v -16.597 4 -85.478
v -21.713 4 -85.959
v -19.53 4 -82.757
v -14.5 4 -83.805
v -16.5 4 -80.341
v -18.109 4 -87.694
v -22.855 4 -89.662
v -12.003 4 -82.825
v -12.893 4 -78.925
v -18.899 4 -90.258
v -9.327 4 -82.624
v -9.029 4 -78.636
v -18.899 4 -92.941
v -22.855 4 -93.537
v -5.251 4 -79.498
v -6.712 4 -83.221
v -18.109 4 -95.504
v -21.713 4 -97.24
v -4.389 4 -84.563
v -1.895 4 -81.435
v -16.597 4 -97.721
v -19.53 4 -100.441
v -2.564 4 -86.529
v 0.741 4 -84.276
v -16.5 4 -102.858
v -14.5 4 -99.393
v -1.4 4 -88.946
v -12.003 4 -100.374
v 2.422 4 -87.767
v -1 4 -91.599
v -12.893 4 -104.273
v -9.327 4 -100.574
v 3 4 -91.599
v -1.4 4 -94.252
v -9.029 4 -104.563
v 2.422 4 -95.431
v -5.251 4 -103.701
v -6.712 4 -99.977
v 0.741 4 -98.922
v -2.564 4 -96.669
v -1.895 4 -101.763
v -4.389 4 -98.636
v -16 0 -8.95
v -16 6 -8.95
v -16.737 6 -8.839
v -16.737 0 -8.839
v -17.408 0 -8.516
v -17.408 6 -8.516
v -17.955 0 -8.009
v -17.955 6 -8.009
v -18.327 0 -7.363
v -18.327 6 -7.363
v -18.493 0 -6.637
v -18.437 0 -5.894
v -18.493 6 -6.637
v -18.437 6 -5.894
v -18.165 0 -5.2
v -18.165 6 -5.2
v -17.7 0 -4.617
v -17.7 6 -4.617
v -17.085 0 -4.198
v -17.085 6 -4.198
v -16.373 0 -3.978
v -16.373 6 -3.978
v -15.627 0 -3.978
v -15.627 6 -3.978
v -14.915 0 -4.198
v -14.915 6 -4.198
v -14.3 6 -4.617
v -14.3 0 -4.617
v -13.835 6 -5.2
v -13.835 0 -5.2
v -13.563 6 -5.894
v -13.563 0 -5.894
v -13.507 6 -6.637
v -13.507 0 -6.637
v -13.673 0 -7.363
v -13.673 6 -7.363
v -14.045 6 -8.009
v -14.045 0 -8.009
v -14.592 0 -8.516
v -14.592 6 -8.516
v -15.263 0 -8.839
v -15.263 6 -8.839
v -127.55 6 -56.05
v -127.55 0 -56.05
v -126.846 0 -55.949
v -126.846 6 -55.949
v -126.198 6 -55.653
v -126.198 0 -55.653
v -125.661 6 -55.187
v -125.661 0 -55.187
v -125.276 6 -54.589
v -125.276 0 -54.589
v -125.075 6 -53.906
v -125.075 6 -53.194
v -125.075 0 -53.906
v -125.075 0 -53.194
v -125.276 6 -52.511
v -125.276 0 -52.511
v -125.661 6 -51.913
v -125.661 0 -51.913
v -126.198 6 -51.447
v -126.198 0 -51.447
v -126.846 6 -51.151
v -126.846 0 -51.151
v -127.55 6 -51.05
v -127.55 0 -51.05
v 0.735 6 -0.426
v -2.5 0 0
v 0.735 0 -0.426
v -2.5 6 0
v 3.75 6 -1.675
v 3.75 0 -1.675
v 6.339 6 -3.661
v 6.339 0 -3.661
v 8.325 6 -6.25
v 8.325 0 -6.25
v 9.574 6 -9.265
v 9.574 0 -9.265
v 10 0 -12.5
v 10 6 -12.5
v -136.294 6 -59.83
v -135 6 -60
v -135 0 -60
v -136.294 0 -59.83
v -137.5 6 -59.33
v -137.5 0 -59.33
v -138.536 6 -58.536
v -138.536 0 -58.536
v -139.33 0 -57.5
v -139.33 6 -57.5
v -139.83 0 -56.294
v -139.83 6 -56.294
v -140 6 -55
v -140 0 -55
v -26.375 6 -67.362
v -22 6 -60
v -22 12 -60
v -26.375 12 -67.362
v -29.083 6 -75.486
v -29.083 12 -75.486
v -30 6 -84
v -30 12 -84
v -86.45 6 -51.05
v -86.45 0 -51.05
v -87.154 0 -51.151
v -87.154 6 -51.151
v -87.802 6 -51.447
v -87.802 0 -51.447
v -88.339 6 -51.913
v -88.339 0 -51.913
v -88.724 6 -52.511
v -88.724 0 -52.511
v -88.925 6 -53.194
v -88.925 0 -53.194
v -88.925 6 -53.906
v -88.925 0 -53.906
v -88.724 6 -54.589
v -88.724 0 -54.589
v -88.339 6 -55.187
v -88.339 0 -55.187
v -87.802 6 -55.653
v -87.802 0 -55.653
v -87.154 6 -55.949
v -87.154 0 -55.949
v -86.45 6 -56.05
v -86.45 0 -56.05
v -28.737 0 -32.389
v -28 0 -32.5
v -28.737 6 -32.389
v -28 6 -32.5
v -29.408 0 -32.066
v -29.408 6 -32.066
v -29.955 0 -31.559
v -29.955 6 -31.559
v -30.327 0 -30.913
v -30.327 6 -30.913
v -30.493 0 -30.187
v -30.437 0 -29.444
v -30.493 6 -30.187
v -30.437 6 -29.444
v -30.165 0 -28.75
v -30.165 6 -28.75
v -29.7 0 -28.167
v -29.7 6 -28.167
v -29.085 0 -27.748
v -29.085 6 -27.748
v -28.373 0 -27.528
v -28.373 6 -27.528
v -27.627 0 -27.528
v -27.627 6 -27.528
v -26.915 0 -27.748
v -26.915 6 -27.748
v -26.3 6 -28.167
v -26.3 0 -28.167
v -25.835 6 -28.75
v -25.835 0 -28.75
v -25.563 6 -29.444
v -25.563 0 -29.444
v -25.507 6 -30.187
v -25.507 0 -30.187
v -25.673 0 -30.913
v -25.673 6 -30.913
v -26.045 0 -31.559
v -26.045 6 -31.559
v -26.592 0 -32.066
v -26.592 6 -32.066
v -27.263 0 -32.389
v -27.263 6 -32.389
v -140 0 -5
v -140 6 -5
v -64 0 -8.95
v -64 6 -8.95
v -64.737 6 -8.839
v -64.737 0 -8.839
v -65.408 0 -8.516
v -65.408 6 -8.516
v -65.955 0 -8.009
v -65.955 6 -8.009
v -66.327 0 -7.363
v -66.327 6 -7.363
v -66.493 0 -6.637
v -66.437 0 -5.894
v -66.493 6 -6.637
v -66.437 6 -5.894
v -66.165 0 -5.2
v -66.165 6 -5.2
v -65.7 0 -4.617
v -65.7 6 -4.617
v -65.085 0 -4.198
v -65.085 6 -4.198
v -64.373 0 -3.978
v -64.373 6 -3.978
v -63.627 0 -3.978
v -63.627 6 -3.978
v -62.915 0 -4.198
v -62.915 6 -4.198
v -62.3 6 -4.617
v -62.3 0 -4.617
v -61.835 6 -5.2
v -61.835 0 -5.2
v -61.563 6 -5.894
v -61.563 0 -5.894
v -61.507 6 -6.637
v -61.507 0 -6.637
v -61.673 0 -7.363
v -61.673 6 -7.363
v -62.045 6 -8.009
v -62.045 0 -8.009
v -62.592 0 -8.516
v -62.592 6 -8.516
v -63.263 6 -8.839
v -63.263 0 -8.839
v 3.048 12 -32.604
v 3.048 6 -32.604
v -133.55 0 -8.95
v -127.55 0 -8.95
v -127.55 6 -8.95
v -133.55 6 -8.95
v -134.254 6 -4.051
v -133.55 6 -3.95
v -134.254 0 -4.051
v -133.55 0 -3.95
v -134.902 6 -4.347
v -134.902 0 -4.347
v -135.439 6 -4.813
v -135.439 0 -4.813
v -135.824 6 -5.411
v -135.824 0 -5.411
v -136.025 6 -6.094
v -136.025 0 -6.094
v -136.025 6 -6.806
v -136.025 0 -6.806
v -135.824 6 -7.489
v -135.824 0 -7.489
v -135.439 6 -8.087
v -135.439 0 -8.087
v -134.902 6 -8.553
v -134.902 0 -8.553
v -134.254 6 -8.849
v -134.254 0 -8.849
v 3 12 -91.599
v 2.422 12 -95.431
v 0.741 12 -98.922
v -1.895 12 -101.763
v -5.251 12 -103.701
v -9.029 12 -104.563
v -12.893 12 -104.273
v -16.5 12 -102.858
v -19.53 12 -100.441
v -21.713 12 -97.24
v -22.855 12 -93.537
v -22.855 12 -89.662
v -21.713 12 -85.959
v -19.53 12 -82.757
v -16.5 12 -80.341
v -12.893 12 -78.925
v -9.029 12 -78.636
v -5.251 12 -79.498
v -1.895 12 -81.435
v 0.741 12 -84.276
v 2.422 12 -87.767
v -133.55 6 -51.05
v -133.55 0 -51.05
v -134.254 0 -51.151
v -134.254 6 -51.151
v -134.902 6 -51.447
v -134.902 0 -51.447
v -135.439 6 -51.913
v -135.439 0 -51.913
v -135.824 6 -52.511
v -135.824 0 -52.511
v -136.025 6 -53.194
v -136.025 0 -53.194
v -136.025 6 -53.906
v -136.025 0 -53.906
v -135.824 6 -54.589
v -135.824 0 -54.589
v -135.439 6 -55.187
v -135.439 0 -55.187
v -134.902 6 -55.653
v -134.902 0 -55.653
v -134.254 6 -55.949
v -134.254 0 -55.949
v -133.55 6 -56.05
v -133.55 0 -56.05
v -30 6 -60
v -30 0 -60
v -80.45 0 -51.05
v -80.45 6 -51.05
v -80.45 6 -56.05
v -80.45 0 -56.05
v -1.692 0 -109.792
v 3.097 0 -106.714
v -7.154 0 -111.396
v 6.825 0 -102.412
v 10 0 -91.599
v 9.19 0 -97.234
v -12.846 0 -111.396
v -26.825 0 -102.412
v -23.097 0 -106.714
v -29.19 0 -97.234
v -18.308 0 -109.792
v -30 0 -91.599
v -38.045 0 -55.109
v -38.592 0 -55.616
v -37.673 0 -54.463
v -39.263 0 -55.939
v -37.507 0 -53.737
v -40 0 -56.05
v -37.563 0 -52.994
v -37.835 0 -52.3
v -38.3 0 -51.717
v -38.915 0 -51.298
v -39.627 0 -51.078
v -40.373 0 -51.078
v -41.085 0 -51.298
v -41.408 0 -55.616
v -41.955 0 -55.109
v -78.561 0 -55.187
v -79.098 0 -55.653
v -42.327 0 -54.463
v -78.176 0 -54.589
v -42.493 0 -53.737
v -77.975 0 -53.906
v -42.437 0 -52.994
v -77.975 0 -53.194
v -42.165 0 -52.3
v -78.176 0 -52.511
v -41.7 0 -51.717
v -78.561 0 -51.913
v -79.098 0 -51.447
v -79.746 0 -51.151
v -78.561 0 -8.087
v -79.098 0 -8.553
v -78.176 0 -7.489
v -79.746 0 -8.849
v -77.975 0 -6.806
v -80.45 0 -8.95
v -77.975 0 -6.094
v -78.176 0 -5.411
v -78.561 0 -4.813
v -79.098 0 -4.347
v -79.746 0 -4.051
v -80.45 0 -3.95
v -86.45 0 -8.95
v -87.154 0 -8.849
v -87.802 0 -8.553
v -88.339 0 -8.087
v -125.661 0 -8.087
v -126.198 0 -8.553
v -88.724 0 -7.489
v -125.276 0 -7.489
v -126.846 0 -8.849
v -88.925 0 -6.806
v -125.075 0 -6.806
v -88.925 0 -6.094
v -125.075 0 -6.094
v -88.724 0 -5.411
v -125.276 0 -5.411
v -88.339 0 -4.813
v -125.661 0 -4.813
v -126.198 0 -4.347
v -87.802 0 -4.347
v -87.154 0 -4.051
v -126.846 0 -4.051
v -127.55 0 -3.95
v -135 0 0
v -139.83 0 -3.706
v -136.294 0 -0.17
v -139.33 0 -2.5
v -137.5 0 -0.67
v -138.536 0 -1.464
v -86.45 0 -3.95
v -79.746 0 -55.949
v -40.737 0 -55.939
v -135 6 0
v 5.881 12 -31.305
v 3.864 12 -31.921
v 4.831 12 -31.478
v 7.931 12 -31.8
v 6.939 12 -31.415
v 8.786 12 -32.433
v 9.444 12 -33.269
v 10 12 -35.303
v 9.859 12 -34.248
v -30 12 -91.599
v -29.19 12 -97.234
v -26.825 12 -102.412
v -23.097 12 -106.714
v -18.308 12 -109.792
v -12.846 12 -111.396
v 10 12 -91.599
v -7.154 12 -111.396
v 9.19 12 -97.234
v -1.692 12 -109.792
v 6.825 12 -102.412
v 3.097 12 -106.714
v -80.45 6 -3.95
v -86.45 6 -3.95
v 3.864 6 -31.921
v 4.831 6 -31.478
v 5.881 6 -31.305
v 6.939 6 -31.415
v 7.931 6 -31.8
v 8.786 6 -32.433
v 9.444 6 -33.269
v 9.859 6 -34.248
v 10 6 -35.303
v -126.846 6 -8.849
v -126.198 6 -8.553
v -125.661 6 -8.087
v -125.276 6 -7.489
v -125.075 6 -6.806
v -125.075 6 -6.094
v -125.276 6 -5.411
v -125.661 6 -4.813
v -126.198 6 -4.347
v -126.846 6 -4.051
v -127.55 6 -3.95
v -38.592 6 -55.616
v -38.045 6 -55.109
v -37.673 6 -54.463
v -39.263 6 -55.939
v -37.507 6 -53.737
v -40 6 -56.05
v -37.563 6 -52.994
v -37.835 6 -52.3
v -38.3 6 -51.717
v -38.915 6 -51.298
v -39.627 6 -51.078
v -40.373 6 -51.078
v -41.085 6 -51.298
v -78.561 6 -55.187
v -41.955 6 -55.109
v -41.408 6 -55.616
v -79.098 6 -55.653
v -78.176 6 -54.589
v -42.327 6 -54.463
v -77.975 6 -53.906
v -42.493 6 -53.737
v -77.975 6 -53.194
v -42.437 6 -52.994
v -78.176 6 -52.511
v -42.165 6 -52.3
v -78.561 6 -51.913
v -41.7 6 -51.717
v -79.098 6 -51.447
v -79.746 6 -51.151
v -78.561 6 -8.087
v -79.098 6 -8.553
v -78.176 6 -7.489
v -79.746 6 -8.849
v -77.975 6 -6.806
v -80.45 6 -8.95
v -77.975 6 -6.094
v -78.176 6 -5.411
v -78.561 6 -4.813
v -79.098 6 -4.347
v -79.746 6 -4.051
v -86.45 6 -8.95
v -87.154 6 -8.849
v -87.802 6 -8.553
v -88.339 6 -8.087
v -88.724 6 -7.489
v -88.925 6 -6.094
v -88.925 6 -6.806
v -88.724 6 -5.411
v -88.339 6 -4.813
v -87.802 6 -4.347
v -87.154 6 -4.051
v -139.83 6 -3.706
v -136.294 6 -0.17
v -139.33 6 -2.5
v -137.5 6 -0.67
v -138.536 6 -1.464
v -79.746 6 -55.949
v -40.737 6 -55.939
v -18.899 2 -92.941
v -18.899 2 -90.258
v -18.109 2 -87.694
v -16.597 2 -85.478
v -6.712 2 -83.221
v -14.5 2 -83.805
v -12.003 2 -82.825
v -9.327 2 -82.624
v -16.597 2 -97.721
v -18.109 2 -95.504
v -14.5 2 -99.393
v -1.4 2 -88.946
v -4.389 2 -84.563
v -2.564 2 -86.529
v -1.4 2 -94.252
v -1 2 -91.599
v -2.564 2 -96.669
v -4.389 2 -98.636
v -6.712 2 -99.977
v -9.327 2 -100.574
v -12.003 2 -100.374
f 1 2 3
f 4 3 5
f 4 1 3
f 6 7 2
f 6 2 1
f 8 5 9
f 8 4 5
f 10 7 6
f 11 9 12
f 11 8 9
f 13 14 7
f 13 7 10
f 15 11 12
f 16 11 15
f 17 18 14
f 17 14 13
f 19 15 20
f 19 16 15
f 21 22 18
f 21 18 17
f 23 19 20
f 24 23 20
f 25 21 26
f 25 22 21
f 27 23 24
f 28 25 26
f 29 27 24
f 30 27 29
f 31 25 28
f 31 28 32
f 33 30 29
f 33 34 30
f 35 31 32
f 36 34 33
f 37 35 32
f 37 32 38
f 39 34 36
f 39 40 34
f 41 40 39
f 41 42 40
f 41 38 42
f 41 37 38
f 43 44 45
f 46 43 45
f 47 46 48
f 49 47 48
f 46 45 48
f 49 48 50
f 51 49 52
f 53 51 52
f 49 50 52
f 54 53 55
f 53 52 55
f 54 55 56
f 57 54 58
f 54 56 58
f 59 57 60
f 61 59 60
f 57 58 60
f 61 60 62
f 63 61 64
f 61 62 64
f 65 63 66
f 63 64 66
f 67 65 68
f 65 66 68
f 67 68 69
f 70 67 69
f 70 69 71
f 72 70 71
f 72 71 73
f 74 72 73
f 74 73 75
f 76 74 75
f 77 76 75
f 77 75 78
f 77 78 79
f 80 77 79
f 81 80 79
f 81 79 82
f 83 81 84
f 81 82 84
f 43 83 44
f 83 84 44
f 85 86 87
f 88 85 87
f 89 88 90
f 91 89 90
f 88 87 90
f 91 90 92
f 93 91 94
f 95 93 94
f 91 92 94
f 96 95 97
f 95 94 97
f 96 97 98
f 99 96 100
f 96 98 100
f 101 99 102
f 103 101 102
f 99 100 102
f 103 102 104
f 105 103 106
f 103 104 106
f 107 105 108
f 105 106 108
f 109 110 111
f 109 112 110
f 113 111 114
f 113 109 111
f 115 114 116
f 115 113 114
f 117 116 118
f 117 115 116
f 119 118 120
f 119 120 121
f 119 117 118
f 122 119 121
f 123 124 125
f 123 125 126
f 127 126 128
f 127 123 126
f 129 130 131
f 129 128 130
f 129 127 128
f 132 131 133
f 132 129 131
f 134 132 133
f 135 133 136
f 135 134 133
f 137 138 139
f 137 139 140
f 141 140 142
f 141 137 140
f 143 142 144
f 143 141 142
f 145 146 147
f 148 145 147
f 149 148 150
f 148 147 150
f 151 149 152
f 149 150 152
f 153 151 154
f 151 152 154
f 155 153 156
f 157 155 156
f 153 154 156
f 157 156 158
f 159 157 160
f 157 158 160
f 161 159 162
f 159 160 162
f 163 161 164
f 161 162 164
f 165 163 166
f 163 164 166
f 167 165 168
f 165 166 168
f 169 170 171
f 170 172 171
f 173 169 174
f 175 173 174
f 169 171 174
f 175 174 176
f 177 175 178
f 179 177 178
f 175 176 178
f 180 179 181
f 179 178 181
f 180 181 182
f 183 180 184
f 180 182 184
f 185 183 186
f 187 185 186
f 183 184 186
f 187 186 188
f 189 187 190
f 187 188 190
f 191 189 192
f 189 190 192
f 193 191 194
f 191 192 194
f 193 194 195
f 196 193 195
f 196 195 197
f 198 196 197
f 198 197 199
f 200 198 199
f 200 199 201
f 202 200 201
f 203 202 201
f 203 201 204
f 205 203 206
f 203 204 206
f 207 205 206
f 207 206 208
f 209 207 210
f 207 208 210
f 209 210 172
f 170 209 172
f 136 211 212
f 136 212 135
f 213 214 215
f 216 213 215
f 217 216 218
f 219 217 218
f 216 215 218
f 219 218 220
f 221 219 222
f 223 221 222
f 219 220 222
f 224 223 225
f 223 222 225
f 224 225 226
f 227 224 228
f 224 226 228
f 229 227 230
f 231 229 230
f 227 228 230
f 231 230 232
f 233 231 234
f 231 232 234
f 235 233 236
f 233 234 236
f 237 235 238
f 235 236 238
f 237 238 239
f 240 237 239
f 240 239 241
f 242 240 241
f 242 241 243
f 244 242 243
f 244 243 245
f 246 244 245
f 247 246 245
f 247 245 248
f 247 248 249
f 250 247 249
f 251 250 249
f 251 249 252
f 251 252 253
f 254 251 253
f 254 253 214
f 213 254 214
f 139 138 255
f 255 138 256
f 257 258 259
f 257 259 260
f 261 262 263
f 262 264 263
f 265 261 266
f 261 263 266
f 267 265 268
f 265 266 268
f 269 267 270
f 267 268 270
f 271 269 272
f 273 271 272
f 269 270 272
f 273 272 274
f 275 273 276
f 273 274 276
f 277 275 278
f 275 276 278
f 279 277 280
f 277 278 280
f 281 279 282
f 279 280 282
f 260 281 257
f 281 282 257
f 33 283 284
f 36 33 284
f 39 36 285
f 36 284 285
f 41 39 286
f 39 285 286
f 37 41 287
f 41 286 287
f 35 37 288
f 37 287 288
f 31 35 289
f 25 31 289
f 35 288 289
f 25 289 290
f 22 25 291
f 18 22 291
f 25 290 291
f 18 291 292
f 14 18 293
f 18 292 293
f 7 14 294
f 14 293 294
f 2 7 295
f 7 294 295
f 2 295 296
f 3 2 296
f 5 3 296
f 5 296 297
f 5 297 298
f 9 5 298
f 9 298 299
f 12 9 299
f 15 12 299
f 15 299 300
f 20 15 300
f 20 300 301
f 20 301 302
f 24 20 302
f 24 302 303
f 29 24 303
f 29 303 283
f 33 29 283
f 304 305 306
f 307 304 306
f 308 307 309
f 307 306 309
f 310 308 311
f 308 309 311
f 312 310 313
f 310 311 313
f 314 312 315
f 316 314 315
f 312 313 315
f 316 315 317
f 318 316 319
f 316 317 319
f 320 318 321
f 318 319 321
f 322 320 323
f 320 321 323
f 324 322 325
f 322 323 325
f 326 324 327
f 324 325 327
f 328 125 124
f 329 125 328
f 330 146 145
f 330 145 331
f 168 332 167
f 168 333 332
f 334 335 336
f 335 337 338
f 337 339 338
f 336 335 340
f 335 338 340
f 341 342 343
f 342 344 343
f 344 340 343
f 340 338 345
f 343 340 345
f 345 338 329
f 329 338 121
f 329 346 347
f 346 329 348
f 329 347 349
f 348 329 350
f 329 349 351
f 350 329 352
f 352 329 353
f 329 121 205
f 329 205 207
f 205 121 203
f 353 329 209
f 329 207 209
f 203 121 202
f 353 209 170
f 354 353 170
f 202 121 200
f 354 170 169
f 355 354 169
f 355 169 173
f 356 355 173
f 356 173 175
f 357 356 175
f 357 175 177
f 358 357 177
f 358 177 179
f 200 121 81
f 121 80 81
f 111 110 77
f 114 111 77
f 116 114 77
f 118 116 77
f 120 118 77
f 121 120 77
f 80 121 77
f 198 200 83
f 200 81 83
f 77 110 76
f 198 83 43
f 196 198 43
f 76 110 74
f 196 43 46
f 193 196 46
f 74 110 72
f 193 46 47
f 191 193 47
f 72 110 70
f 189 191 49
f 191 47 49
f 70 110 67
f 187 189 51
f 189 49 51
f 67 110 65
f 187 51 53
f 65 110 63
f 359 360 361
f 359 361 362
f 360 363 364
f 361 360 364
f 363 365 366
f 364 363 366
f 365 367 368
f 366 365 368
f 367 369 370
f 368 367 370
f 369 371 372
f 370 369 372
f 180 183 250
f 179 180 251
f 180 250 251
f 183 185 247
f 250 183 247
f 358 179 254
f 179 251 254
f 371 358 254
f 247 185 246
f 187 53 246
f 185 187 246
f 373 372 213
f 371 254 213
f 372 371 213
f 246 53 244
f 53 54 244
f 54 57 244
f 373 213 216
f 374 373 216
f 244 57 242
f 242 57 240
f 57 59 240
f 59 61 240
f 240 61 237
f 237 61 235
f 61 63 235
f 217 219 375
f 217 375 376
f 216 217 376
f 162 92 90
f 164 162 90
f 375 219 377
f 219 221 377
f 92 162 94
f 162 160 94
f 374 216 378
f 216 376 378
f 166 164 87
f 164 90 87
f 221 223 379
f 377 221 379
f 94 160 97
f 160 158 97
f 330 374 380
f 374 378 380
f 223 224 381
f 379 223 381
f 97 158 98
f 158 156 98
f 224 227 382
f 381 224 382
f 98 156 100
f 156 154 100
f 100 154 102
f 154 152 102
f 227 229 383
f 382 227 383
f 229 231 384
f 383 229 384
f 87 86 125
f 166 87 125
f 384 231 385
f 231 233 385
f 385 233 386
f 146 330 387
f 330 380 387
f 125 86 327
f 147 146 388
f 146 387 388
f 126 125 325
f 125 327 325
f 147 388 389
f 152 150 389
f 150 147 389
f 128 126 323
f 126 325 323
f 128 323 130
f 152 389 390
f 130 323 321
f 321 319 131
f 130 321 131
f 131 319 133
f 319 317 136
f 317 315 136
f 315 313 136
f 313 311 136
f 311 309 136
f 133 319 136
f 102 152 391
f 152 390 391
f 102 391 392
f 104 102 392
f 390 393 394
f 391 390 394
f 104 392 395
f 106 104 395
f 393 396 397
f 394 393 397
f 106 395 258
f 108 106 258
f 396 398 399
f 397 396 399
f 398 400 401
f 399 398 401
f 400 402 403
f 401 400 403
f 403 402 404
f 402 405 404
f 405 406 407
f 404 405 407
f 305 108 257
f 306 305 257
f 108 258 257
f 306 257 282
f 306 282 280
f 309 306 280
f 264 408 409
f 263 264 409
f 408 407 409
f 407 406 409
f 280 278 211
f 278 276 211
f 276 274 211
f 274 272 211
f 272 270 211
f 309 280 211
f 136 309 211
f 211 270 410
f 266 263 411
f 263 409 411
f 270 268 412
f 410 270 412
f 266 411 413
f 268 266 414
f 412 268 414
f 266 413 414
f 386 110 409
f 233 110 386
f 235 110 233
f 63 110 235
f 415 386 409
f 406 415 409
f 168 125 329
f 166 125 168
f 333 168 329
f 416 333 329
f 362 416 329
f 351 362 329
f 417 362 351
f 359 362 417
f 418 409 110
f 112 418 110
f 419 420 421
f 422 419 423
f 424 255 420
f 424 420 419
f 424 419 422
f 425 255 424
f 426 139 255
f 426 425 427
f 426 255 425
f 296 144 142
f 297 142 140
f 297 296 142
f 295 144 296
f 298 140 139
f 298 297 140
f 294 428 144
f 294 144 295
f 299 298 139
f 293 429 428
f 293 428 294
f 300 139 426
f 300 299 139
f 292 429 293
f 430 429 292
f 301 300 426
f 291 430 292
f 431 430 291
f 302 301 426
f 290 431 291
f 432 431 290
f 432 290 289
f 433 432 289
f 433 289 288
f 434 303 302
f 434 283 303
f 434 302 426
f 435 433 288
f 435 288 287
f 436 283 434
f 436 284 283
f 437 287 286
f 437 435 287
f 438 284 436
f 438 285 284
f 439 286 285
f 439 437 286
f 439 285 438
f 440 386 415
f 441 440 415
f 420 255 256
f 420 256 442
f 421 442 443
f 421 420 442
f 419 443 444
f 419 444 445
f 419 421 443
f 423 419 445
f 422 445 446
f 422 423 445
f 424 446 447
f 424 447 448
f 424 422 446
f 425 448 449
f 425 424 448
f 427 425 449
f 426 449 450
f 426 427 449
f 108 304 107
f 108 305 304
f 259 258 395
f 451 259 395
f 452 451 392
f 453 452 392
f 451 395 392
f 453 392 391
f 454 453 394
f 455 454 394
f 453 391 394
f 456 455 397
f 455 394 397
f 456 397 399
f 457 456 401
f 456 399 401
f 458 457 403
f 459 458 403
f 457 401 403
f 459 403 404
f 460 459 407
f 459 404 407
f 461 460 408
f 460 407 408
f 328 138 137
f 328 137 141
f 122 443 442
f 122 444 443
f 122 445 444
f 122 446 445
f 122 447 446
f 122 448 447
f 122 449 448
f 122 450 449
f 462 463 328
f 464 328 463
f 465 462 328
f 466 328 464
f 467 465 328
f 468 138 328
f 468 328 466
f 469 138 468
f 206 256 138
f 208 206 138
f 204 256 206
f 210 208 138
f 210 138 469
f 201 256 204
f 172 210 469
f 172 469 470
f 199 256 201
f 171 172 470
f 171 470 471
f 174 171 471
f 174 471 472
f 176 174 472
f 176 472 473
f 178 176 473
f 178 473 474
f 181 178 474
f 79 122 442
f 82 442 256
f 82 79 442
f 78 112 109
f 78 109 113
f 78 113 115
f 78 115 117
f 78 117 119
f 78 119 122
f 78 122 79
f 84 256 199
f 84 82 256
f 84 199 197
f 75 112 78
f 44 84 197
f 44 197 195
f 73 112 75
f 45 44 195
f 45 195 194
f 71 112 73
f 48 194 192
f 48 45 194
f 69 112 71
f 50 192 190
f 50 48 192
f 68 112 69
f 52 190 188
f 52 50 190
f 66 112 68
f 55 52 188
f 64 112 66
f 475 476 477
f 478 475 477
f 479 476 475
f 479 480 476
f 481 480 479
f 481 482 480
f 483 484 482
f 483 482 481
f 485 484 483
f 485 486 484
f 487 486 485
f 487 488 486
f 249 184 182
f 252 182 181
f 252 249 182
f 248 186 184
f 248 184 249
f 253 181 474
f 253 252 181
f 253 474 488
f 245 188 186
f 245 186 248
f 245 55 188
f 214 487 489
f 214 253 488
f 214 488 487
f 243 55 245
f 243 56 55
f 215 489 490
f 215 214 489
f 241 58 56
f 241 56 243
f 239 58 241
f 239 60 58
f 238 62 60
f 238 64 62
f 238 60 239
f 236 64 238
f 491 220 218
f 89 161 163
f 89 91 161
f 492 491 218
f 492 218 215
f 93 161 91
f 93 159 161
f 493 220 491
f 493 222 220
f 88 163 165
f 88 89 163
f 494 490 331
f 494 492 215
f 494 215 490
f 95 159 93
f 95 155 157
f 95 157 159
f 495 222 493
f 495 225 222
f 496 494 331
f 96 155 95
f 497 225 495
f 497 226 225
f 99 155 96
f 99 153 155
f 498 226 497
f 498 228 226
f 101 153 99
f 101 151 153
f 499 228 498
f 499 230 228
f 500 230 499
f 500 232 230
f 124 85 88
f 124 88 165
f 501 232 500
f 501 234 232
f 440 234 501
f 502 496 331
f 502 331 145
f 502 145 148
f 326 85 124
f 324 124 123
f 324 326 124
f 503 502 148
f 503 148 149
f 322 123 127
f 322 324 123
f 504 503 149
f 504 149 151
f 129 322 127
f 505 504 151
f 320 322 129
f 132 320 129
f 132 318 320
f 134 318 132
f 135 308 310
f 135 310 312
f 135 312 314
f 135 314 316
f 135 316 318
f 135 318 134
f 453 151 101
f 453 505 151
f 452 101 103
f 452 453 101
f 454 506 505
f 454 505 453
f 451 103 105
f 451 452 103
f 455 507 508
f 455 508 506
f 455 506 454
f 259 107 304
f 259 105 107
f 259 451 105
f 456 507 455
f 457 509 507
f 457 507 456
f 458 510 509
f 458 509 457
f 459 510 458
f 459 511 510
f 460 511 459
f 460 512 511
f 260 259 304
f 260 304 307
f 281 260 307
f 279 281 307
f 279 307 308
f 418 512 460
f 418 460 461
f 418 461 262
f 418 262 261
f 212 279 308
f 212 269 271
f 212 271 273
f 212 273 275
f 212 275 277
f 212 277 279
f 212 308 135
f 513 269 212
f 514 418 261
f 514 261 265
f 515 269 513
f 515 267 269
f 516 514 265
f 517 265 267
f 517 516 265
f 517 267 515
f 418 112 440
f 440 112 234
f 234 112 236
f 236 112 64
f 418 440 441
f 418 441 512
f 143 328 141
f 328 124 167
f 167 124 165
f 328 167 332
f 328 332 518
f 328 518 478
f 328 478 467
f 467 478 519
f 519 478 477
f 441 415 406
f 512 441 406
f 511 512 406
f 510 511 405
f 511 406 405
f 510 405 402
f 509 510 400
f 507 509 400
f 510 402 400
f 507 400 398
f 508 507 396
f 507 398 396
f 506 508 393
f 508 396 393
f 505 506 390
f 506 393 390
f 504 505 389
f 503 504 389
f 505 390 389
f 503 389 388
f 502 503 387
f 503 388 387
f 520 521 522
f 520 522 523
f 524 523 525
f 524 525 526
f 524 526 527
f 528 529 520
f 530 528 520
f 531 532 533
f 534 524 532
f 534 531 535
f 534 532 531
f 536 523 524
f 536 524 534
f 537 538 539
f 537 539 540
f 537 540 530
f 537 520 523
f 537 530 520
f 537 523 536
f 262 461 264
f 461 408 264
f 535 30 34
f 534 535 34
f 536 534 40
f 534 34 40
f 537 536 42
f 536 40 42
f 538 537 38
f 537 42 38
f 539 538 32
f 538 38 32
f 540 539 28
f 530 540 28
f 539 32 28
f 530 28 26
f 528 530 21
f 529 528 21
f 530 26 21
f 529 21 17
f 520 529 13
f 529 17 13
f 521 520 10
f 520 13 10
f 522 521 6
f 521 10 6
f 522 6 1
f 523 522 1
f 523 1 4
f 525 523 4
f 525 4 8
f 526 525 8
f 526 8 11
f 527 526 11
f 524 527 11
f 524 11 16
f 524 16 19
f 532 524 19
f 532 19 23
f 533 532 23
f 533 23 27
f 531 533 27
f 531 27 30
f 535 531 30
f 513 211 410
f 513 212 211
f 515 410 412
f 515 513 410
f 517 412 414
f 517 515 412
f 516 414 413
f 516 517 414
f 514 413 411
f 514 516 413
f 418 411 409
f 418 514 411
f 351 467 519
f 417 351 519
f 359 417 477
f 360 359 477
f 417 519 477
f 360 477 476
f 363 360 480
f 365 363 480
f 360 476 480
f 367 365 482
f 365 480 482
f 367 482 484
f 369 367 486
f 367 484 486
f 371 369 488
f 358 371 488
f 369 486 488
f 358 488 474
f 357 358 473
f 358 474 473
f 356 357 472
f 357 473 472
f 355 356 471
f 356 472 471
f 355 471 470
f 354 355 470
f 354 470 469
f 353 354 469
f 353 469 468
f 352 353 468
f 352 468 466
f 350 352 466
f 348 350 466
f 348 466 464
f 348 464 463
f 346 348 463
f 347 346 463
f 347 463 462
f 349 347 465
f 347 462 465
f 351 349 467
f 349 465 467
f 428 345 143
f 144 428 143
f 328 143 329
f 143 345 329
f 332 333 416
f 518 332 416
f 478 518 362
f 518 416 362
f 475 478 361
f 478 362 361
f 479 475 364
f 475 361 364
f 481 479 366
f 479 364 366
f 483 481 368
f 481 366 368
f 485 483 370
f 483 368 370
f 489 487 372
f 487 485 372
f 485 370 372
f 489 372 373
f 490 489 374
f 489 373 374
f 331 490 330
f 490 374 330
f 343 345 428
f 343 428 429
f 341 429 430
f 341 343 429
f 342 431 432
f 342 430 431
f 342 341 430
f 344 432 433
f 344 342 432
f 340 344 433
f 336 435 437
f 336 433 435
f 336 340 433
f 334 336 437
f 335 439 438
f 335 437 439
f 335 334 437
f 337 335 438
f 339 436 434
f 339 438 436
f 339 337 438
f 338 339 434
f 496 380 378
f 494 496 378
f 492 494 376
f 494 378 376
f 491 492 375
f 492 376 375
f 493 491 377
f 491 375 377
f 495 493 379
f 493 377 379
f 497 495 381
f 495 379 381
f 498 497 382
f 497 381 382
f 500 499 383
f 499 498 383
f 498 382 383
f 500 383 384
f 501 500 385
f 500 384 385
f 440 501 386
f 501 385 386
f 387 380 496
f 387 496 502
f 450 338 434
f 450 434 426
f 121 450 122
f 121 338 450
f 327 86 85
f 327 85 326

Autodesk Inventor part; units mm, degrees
ref_plane "YZ Plane" through (0, 0, 0) normal (1, 0, 0) x (0, 1, 0)
ref_plane "XZ Plane" through (0, 0, 0) normal (0, 1, 0) x (-1, 0, 0)
ref_plane "XY Plane" through (0, 0, 0) normal (0, 0, 1) x (1, 0, 0)
sketch "Sketch1" plane through (0, 0, 0) normal (0, 1, 0) x (-1, 0, 0)
  line L0 (140, 0) -> (74, 0)
  line L1 (74, 0) -> (76, 0)
  line L2 (140, 0) -> (140, -60)
  line L3 (140, -60) -> (140, 0)
  line L4 (138, -58) -> (82, -2)
  line L5 (82, -58) -> (138, -2)
  line L6 (110, -30) -> (110, -49.4)
  line L7 (86.45, -6.45) -> (86.45, -53.55)
  line L8 (82, -58) -> (82, -2)
  line L9 (76, -58) -> (76, -2)
  line L10 (74, 0) -> (74, -60)
  line L11 (74, 0) -> (74, -60)
  circle A0 centre (86.45, -6.45) radius 2.5
  line L12 (76, -2) -> (138, -2)
  line L13 (80.45, -8.95) -> (133.55, -8.95)
  line L14 (80.45, -3.95) -> (133.55, -3.95)
  line L15 (133.55, -6.45) -> (86.45, -6.45)
  line L16 (82, -2) -> (138, -2)
  line L17 (104, -10.6) -> (110, -10.6)
  line L18 (138, -2) -> (138, -58)
  line L19 (138, -2) -> (138, -58)
  line L20 (133.55, -53.55) -> (133.55, -6.45)
  line L21 (140, -60) -> (138, -60)
  line L22 (138, -60) -> (138, -58)
  line L23 (138, -58) -> (140, -58)
  line L24 (140, -58) -> (140, -60)
  line L25 (104, -49.4) -> (110, -49.4)
  circle A1 centre (86.45, -53.55) radius 2.5
  line L26 (133.55, -51.05) -> (80.45, -51.05)
  line L27 (86.45, -53.55) -> (133.55, -53.55)
  line L28 (80.45, -56.05) -> (133.55, -56.05)
  line L29 (138, -58) -> (82, -58)
  line L30 (138, -58) -> (76, -58)
  line L31 (74, -60) -> (140, -60)
  line L32 (140, -60) -> (32, -60)
  circle A2 centre (127.55, -53.55) radius 2.5
  line L33 (104, -30) -> (104, -49.4)
  circle A3 centre (80.45, -6.45) radius 2.5
  line L34 (86.45, -53.55) -> (82, -53.55)
  line L35 (82, -58) -> (86.45, -58)
  line L36 (86.45, -58) -> (86.45, -53.55)
  line L37 (82, -53.55) -> (82, -58)
  circle A4 centre (80.45, -53.55) radius 2.5
  circle A5 centre (133.55, -53.55) radius 2.5
  line L38 (76, 0) -> (76, -2)
  line L39 (76, -2) -> (74, -2)
  line L40 (74, -2) -> (74, 0)
  line L41 (138, -2) -> (133.55, -2)
  line L42 (133.55, -2) -> (133.55, -6.45)
  line L43 (133.55, -6.45) -> (138, -6.45)
  line L44 (138, -6.45) -> (138, -2)
  circle A6 centre (127.55, -6.45) radius 2.5
  circle A7 centre (133.55, -6.45) radius 2.5
  line L45 (0, -25) -> (0, 0)
  line L46 (32, -60) -> (0, -25)
  line L47 (0, -25) -> (0, 0)
  line L48 (0, 0) -> (74, 0)
  line L49 (0, 0) -> (74, 0)
  line L50 (140, -60) -> (140, 0)
  line L51 (140, -60) -> (0, -60)
  line L52 (0, -60) -> (0, 0)
  line L53 (0, 0) -> (140, 0)
  line L54 (140, 0) -> (140, -60)
  line L55 (0, -60) -> (40, -60)
  line L56 (40, -60) -> (40, -100)
  line L57 (40, -100) -> (0, -100)
  line L58 (0, -100) -> (0, -60)
  line L59 (140, 0) -> (74, 0)
  line L60 (74, 0) -> (76, 0)
  line L61 (140, 0) -> (140, -60)
  line L62 (140, -60) -> (140, 0)
  line L63 (138, -58) -> (82, -2)
  line L64 (82, -58) -> (138, -2)
  circle A8 centre (110, -30) radius 19.4
  circle A9 centre (104, -30) radius 19.4
  line L65 (110, -30) -> (110, -49.4)
  line L66 (86.45, -6.45) -> (86.45, -53.55)
  line L67 (82, -58) -> (82, -2)
  line L68 (76, -58) -> (76, -2)
  line L69 (74, 0) -> (74, -60)
  line L70 (74, 0) -> (74, -60)
  circle A10 centre (86.45, -6.45) radius 2.5
  line L71 (76, -2) -> (138, -2)
  line L72 (80.45, -8.95) -> (133.55, -8.95)
  line L73 (80.45, -3.95) -> (133.55, -3.95)
  line L74 (133.55, -6.45) -> (86.45, -6.45)
  line L75 (82, -2) -> (138, -2)
  line L76 (104, -10.6) -> (110, -10.6)
  line L77 (138, -2) -> (138, -58)
  line L78 (138, -2) -> (138, -58)
  line L79 (133.55, -53.55) -> (133.55, -6.45)
  line L80 (140, -60) -> (138, -60)
  line L81 (138, -60) -> (138, -58)
  line L82 (138, -58) -> (140, -58)
  line L83 (140, -58) -> (140, -60)
  line L84 (104, -49.4) -> (110, -49.4)
  circle A11 centre (86.45, -53.55) radius 2.5
  line L85 (133.55, -51.05) -> (80.45, -51.05)
  line L86 (86.45, -53.55) -> (133.55, -53.55)
  line L87 (80.45, -56.05) -> (133.55, -56.05)
  line L88 (138, -58) -> (82, -58)
  line L89 (138, -58) -> (76, -58)
  line L90 (74, -60) -> (140, -60)
  line L91 (140, -60) -> (32, -60)
  circle A12 centre (127.55, -53.55) radius 2.5
  line L92 (104, -30) -> (104, -49.4)
  circle A13 centre (80.45, -6.45) radius 2.5
  line L93 (86.45, -53.55) -> (82, -53.55)
  line L94 (82, -58) -> (86.45, -58)
  line L95 (86.45, -58) -> (86.45, -53.55)
  line L96 (82, -53.55) -> (82, -58)
  circle A14 centre (80.45, -53.55) radius 2.5
  circle A15 centre (133.55, -53.55) radius 2.5
  line L97 (76, 0) -> (76, -2)
  line L98 (76, -2) -> (74, -2)
  line L99 (74, -2) -> (74, 0)
  line L100 (138, -2) -> (133.55, -2)
  line L101 (133.55, -2) -> (133.55, -6.45)
  line L102 (133.55, -6.45) -> (138, -6.45)
  line L103 (138, -6.45) -> (138, -2)
  circle A16 centre (127.55, -6.45) radius 2.5
  circle A17 centre (133.55, -6.45) radius 2.5
  line L104 (0, -25) -> (0, 0)
  line L105 (32, -60) -> (0, -25)
  line L106 (0, -25) -> (0, 0)
  line L107 (0, 0) -> (74, 0)
  line L108 (0, 0) -> (74, 0)
  line L109 (140, -60) -> (140, 0)
  line L110 (140, -60) -> (0, -60)
  line L111 (0, -60) -> (0, 0)
  line L112 (0, 0) -> (140, 0)
  line L113 (140, 0) -> (140, -60)
  line L114 (0, -60) -> (40, -60)
  line L115 (40, -60) -> (40, -100)
  line L116 (40, -100) -> (0, -100)
  line L117 (0, -100) -> (0, -60)
  line L118 (40, -100) -> (0, -60)
  line L119 (40, -60) -> (0, -100)
  circle A18 centre (104, -30) radius 10.5
  line L120 (0, -68.6498) -> (0, 0)
  line L121 (20, -80) -> (20, -180)
  line L122 (104, -30) -> (-49.3689, -120.7578)
  circle A19 centre (20, -80) radius 17
  line L123 (20, -134.4641) -> (10, -134.4641)
  line L124 (10, -134.4641) -> (10, -50)
  line L125 (10, -50) -> (20, -50)
  line L126 (20, -50) -> (20, -134.4641)
  circle A20 centre (10, -91.5992) radius 40
  circle A21 centre (10, -91.5992) radius 20
  line L127 (10, -95.8192) -> (-10, -95.8192)
  line L128 (-10, -95.8192) -> (-10, 0)
  line L129 (-10, 0) -> (10, 0)
  line L130 (10, 0) -> (10, -95.8192)
  line L131 (-10, -95.8192) -> (30, -95.8192)
  line L132 (30, -95.8192) -> (30, 0)
  line L133 (30, 0) -> (-10, 0)
  line L134 (-10, 0) -> (-10, -95.8192)
  line L135 (10, -95.8192) -> (10, -91.5992)
  line L136 (10, -91.5992) -> (9.1265, -91.5992)
  point P0 (127.55, 3.95)
  point P1 (127.55, 8.95)
  point P2 (86.45, 3.95)
  point P3 (86.45, 8.95)
  point P4 (127.55, 56.05)
  point P5 (127.55, 51.05)
  point P6 (86.45, 56.05)
  point P7 (86.45, 51.05)
  point P8 (123.7179, -16.2821)
  point P9 (131.05, -8.95)
  point P10 (88.95, -8.95)
  point P11 (88.2178, -8.2178)
  point P12 (86.45, -8.95)
  point P13 (82, -3.95)
  point P14 (135.3178, -55.3178)
  point P15 (127.55, -56.05)
  point P16 (127.55, -51.05)
  point P17 (131.05, -51.05)
  point P18 (123.7179, -43.7179)
  point P19 (86.45, -51.05)
  point P20 (86.45, -56.05)
  point P21 (86.45, -3.95)
  point P22 (127.55, -8.95)
  point P23 (127.55, -3.95)
  point P24 (86.45, -8.95)
  point P25 (86.45, -3.95)
  point P26 (127.55, -56.05)
  point P27 (127.55, -51.05)
  point P28 (127.55, -8.95)
  point P29 (127.55, -3.95)
  point P30 (86.45, -51.05)
  point P31 (86.45, -56.05)
  point P32 (127.55, 3.95)
  point P33 (127.55, 8.95)
  point P34 (86.45, 3.95)
  point P35 (86.45, 8.95)
  point P36 (127.55, 56.05)
  point P37 (127.55, 51.05)
  point P38 (86.45, 56.05)
  point P39 (86.45, 51.05)
  point P40 (123.7179, -16.2821)
  point P41 (131.05, -8.95)
  point P42 (88.95, -8.95)
  point P43 (88.2178, -8.2178)
  point P44 (86.45, -8.95)
  point P45 (82, -3.95)
  point P46 (135.3178, -55.3178)
  point P47 (127.55, -56.05)
  point P48 (127.55, -51.05)
  point P49 (131.05, -51.05)
  point P50 (123.7179, -43.7179)
  point P51 (86.45, -51.05)
  point P52 (86.45, -56.05)
  point P53 (86.45, -3.95)
  point P54 (127.55, -8.95)
  point P55 (127.55, -3.95)
  point P56 (30, -60)
  point P57 (88.95, -51.05)
  point P58 (88.2178, -51.7822)
  point P59 (88.2178, -8.2178)
  point P60 (88.95, -8.95)
  point P61 (-10, -91.5992)
  point P62 (30, -91.5992)
  point P63 (30, -60)
  point P64 (104.0094, -10.6)
  point P65 (109.9957, -10.6)
  dimension "d0" = 40
  dimension "d1" = 40
  dimension "d43" = 40
  dimension "d44" = 40
  dimension "d45" = 21
  dimension "d46" = 100
  dimension "d47" = 34
  dimension "d48" = 10
  dimension "d49" = 80
  dimension "d50" = 40
  dimension "d51" = 20
  dimension "d81" = 4.22
extrude "Extrusion5" add sketch "Sketch1" along normal blind 6 contours L2 L23 L18 L12 L38 L0 | L38 L39 L10 L0 | L2 L21 L22 L23 | L10 L122 L32 A20 L132 L48 | L12 L8 L14 A3 L13 L122 L9 | L9 L122 L10 L39 | L29 L36 L28 A5 L4 | L4 A5 L20 A7 L43 L18 | L22 L31 L10 L122 L9 L30 L29 | L132 A20 L46 L130 L48 | L122 L8 L26 A4 L28 L30 L9 | L12 L42 L14 L4 | L4 L14 L8 | L43 A7 L5 L18 | L29 L5 L28 L36 | L10 L32 L122 | L130 L46 L45 L48 | L132 L46 A20 | A20 L32 L46 L132 | L122 L7 L26 L8 | L8 L13 L7 A9 L122 | L12 L5 A7 L42 | L8 L28 L5 | A1 L27 A2 L28 | L45 L52 A20 L128 L129 | L130 L124 A20 L52 L46 | L46 A20 L126 L125 L130 | L46 L132 L51 L126 A20 | L46 L51 L132 | L122 A9 L5 L26 L7 | L7 A9 L122 | L14 A6 L15 A0 | L26 L4 A8 L5 L13 L20 | A1 L5 L26 A2 L27 | L125 L126 A20 L124 | L126 L51 L124 A20 | L132 A19 L126 L51 | L26 L5 A1 | L13 L4 A9 L7 | A0 L4 L13 | A9 L7 | L7 A9 L4 A8 L122 | L122 A8 L5 A9 | L15 A6 L13 L4 A0 | L26 L5 A9 L25 A8 L4 | L5 A8 L17 A9 L4 L13 | A20 L124 L51 L52 | L52 L58 A21 L128 A20 | L126 A19 L124 L51 | L132 L119 A21 L126 A19 | L5 A8 L33 A9 | L122 A18 L5 A8 | A8 L4 A18 L122 | A8 L6 A9 L4 | L4 A9 L5 A8 | L5 A9 A8 | L118 A19 A21 L58 | L51 L124 A19 L118 | A21 L58 L122 L127 | L132 L122 A21 L119 | L126 A21 L118 L124 A19 | A9 A8 L4 | L5 A18 L33 A8 | A9 A8 L25 | L33 A8 A9 | A8 A9 L5 A18 L4 | L122 L33 L5 A18 | A18 L4 L5 L33 L122 | A9 L6 A18 L4 | L4 A18 L5 A9 | A8 A9 L6 | A8 A9 L17 | A21 L121 L57 | L57 L121 A19 L131 A21 | L132 L118 A21 L122 | A21 L124 L57 L121 | A19 L124 L118 | L118 L124 A21 A19 | A21 L127 L122 | L122 L127 L58 L57 L124 A21 | A21 A19 L122 L58 | A21 L122 L119 | L119 L122 L126 A21 | L126 L122 L118 A21 | L5 L33 A18 | L33 A18 L6 A9 A8 | A18 L5 L4 | A18 L6 L4 | L4 L5 A18 | L57 L124 L131 A19 L121 | L131 A19 A21 | L132 A21 L118 | A21 L118 L119 L122 | L118 A21 L124 | A21 L124 L122 A19 | L122 L58 L127 | L122 A19 L119 L127 L58 | L119 L126 L122 | L126 L118 L122 | L118 L122 L124 A21 | L5 L6 A18 L33 | L57 L119 L127 L124 | A19 L131 L121 | L121 L131 A19 | A19 L131 L121 L118 A21 | L122 L124 L119 A19 | L127 L119 L58 | L119 L124 L122 L118 | L121 L131 A19 L124 L119 | L127 L119 A19 L124 | L124 A19 L131 | L119 L124 A19
sketch "Sketch7" plane through (0, 6, 0) normal (0, 1, 0) x (1, 0, 0)
  line L0 (0, 0) -> (-140, 0)
  line L1 (-32, 0) -> (0, 0)
  line L2 (-140, 0) -> (-140, 60)
  line L3 (-140, 60) -> (-32, 60)
  line L4 (0, 25) -> (0, 0)
  line L5 (0, 0) -> (0, 25)
  line L6 (0, 0) -> (0, 25)
  line L7 (0, 25) -> (-32, 60)
  line L8 (-32, 60) -> (10, 14.0625)
  line L9 (10, 0) -> (10, 91.5992) projected
  arc A0 (10, 91.5992) -> (-30, 91.5992) centre (-10, 91.5992) ccw projected
  circle A1 centre (-10, 91.5992) radius 20
  line L10 (-30, 91.5992) -> (-30, 60) projected
  line L11 (-30, 91.5992) -> (-30, 60)
  line L12 (-30, 60) -> (-32, 60)
  line L13 (10, 91.5992) -> (10, 14.0625)
  line L14 (0, 25) -> (0, 0)
  line L15 (135, 0) -> (-10, 0)
  line L16 (-10, 0) -> (0, 0)
  line L17 (0, 0) -> (0, 25)
  line L18 (10, 25) -> (10, 0)
  line L19 (-32, 60) -> (-22, 60)
  line L20 (-22, 60) -> (10, 25)
  line L21 (-69, 60) -> (-32, 60)
  line L22 (0, 25) -> (-32, 60)
  point P0 (6.0531, 31.6206)
fillet "Fillet10" radius 5 2 edges at (-140, 3, -60) (-140, 3, 0)
fillet "Fillet11" radius 12.5 1 edges at (10, 3, 0)
sketch "Sketch10" plane through (0, 0, 0) normal (0, -1, 0) x (1, 0, 0)
  line L0 (74, 60) -> (0, 60)
  line L1 (0, 60) -> (0, 0)
  line L2 (0, 0) -> (74, 0)
  line L3 (74, 0) -> (74, 60)
  arc A0 (80.45, 8.95) -> (80.45, 3.95) centre (80.45, 6.45) ccw
  line L4 (80.45, 6.45) -> (0, 6.45)
  arc A1 (80.45, 56.05) -> (80.45, 51.05) centre (80.45, 53.55) ccw
  line L5 (80.45, 53.55) -> (0, 53.55)
  line L6 (0, 20) -> (0, 80)
  line L7 (74, 18.2674) -> (74, 55)
  line L8 (74, 53.55) -> (64, 53.55)
  line L9 (64, 53.55) -> (64, 6.45)
  line L10 (64, 53.55) -> (40, 53.55)
  line L11 (64, 6.45) -> (40, 6.45)
  line L12 (40, 6.45) -> (16, 6.45)
  line L13 (16, 6.45) -> (40, 53.55)
  line L14 (40, 53.55) -> (28.6497, 31.2751)
  arc A2 (104, 49.4) -> (98.7489, 11.3242) centre (104, 30) ccw
  line L15 (104, 30) -> (28, 30)
  line L16 (-53.55, 64) -> (-53.55, 40)
  line L17 (-18.2674, 74) -> (-55, 74)
  line L18 (-30, 104) -> (-30, 28)
  line L19 (-53.55, 40) -> (-31.2751, 28.6497)
  line L20 (-53.55, 64) -> (-6.45, 64)
  line L21 (0, 74) -> (-60, 74)
  line L22 (-6.45, 64) -> (-6.45, 40)
  line L23 (-60, 74) -> (-60, 0)
  line L24 (-53.55, 80.45) -> (-53.55, 0)
  line L25 (-6.45, 80.45) -> (-6.45, 0)
  line L26 (0, 0) -> (0, 74)
  line L27 (-6.45, 40) -> (-6.45, 16)
  line L28 (-6.45, 16) -> (-53.55, 40)
  line L29 (-60, 0) -> (0, 0)
  arc A3 (-56.05, 80.45) -> (-51.05, 80.45) centre (-53.55, 80.45) ccw
  line L30 (-53.55, 74) -> (-53.55, 64)
  arc A4 (-8.95, 80.45) -> (-3.95, 80.45) centre (-6.45, 80.45) ccw
  line L31 (-20, 0) -> (-80, 0)
  arc A5 (-49.4, 104) -> (-11.3242, 98.7489) centre (-30, 104) ccw
  line L32 (-64, -53.55) -> (-40, -53.55)
  line L33 (-74, -18.2674) -> (-74, -55)
  line L34 (-104, -30) -> (-28, -30)
  line L35 (-40, -53.55) -> (-28.6497, -31.2751)
  line L36 (-64, -53.55) -> (-64, -6.45)
  line L37 (-74, 0) -> (-74, -60)
  line L38 (-64, -6.45) -> (-40, -6.45)
  line L39 (-74, -60) -> (0, -60)
  line L40 (-80.45, -53.55) -> (0, -53.55)
  line L41 (-80.45, -6.45) -> (0, -6.45)
  line L42 (0, 0) -> (-74, 0)
  line L43 (-40, -6.45) -> (-16, -6.45)
  line L44 (-16, -6.45) -> (-40, -53.55)
  line L45 (0, -60) -> (0, 0)
  arc A6 (-80.45, -56.05) -> (-80.45, -51.05) centre (-80.45, -53.55) ccw
  line L46 (-74, -53.55) -> (-64, -53.55)
  arc A7 (-80.45, -8.95) -> (-80.45, -3.95) centre (-80.45, -6.45) ccw
  line L47 (0, -20) -> (0, -80)
  arc A8 (-104, -49.4) -> (-98.7489, -11.3242) centre (-104, -30) ccw
  line L48 (53.55, -64) -> (53.55, -40)
  line L49 (18.2674, -74) -> (55, -74)
  line L50 (30, -104) -> (30, -28)
  line L51 (53.55, -40) -> (31.2751, -28.6497)
  line L52 (53.55, -64) -> (6.45, -64)
  line L53 (0, -74) -> (60, -74)
  line L54 (6.45, -64) -> (6.45, -40)
  line L55 (60, -74) -> (60, 0)
  line L56 (53.55, -80.45) -> (53.55, 0)
  line L57 (6.45, -80.45) -> (6.45, 0)
  line L58 (0, 0) -> (0, -74)
  line L59 (6.45, -40) -> (6.45, -16)
  line L60 (6.45, -16) -> (53.55, -40)
  line L61 (60, 0) -> (0, 0)
  arc A9 (56.05, -80.45) -> (51.05, -80.45) centre (53.55, -80.45) ccw
  line L62 (53.55, -74) -> (53.55, -64)
  arc A10 (8.95, -80.45) -> (3.95, -80.45) centre (6.45, -80.45) ccw
  line L63 (20, 0) -> (80, 0)
  arc A11 (49.4, -104) -> (11.3242, -98.7489) centre (30, -104) ccw
  dimension "d66" = 10
  dimension "d67" = 24
  dimension "d68" = 24
  dimension "d69" = 24
  dimension "d72" = 360
hole "Hole3" at (-40, 0, -53.55) at (-28, 0, -30) at (-16, 0, -6.45) at (-64, 0, -6.45) direction (0, 1, 0) diameter 5 end through all
extrude "Extrusion9" add sketch "Sketch7" along normal blind 6 contours L10 A1 L9 L20 L19 | A0 A1
sketch "Sketch11" plane through (0, 12, 0) normal (0, 1, 0) x (1, 0, 0)
  arc A0 (10, 91.5992) -> (-30, 91.5992) centre (-10, 91.5992) ccw projected
  circle A1 centre (-10, 91.5992) radius 13
  point P0 (0, 0)
  dimension "d89" = 26
extrude "Extrusion12" cut sketch "Sketch11" against normal blind 8
sketch "Sketch12" plane through (-10, 4, -91.5992) normal (0, 1, 0) x (1, 0, 0)
  circle A0 centre (0, 0) radius 9
  point P0 (10, -91.5992)
  dimension "d92" = 18
extrude "Extrusion13" cut sketch "Sketch12" against normal blind 2
fillet "Fillet13" radius 4 1 edges at (10, 9, -25)
fillet "Fillet14" radius 40 1 edges at (-30, 9, -60)
properties part number "duza_czesc_pokrywka"
